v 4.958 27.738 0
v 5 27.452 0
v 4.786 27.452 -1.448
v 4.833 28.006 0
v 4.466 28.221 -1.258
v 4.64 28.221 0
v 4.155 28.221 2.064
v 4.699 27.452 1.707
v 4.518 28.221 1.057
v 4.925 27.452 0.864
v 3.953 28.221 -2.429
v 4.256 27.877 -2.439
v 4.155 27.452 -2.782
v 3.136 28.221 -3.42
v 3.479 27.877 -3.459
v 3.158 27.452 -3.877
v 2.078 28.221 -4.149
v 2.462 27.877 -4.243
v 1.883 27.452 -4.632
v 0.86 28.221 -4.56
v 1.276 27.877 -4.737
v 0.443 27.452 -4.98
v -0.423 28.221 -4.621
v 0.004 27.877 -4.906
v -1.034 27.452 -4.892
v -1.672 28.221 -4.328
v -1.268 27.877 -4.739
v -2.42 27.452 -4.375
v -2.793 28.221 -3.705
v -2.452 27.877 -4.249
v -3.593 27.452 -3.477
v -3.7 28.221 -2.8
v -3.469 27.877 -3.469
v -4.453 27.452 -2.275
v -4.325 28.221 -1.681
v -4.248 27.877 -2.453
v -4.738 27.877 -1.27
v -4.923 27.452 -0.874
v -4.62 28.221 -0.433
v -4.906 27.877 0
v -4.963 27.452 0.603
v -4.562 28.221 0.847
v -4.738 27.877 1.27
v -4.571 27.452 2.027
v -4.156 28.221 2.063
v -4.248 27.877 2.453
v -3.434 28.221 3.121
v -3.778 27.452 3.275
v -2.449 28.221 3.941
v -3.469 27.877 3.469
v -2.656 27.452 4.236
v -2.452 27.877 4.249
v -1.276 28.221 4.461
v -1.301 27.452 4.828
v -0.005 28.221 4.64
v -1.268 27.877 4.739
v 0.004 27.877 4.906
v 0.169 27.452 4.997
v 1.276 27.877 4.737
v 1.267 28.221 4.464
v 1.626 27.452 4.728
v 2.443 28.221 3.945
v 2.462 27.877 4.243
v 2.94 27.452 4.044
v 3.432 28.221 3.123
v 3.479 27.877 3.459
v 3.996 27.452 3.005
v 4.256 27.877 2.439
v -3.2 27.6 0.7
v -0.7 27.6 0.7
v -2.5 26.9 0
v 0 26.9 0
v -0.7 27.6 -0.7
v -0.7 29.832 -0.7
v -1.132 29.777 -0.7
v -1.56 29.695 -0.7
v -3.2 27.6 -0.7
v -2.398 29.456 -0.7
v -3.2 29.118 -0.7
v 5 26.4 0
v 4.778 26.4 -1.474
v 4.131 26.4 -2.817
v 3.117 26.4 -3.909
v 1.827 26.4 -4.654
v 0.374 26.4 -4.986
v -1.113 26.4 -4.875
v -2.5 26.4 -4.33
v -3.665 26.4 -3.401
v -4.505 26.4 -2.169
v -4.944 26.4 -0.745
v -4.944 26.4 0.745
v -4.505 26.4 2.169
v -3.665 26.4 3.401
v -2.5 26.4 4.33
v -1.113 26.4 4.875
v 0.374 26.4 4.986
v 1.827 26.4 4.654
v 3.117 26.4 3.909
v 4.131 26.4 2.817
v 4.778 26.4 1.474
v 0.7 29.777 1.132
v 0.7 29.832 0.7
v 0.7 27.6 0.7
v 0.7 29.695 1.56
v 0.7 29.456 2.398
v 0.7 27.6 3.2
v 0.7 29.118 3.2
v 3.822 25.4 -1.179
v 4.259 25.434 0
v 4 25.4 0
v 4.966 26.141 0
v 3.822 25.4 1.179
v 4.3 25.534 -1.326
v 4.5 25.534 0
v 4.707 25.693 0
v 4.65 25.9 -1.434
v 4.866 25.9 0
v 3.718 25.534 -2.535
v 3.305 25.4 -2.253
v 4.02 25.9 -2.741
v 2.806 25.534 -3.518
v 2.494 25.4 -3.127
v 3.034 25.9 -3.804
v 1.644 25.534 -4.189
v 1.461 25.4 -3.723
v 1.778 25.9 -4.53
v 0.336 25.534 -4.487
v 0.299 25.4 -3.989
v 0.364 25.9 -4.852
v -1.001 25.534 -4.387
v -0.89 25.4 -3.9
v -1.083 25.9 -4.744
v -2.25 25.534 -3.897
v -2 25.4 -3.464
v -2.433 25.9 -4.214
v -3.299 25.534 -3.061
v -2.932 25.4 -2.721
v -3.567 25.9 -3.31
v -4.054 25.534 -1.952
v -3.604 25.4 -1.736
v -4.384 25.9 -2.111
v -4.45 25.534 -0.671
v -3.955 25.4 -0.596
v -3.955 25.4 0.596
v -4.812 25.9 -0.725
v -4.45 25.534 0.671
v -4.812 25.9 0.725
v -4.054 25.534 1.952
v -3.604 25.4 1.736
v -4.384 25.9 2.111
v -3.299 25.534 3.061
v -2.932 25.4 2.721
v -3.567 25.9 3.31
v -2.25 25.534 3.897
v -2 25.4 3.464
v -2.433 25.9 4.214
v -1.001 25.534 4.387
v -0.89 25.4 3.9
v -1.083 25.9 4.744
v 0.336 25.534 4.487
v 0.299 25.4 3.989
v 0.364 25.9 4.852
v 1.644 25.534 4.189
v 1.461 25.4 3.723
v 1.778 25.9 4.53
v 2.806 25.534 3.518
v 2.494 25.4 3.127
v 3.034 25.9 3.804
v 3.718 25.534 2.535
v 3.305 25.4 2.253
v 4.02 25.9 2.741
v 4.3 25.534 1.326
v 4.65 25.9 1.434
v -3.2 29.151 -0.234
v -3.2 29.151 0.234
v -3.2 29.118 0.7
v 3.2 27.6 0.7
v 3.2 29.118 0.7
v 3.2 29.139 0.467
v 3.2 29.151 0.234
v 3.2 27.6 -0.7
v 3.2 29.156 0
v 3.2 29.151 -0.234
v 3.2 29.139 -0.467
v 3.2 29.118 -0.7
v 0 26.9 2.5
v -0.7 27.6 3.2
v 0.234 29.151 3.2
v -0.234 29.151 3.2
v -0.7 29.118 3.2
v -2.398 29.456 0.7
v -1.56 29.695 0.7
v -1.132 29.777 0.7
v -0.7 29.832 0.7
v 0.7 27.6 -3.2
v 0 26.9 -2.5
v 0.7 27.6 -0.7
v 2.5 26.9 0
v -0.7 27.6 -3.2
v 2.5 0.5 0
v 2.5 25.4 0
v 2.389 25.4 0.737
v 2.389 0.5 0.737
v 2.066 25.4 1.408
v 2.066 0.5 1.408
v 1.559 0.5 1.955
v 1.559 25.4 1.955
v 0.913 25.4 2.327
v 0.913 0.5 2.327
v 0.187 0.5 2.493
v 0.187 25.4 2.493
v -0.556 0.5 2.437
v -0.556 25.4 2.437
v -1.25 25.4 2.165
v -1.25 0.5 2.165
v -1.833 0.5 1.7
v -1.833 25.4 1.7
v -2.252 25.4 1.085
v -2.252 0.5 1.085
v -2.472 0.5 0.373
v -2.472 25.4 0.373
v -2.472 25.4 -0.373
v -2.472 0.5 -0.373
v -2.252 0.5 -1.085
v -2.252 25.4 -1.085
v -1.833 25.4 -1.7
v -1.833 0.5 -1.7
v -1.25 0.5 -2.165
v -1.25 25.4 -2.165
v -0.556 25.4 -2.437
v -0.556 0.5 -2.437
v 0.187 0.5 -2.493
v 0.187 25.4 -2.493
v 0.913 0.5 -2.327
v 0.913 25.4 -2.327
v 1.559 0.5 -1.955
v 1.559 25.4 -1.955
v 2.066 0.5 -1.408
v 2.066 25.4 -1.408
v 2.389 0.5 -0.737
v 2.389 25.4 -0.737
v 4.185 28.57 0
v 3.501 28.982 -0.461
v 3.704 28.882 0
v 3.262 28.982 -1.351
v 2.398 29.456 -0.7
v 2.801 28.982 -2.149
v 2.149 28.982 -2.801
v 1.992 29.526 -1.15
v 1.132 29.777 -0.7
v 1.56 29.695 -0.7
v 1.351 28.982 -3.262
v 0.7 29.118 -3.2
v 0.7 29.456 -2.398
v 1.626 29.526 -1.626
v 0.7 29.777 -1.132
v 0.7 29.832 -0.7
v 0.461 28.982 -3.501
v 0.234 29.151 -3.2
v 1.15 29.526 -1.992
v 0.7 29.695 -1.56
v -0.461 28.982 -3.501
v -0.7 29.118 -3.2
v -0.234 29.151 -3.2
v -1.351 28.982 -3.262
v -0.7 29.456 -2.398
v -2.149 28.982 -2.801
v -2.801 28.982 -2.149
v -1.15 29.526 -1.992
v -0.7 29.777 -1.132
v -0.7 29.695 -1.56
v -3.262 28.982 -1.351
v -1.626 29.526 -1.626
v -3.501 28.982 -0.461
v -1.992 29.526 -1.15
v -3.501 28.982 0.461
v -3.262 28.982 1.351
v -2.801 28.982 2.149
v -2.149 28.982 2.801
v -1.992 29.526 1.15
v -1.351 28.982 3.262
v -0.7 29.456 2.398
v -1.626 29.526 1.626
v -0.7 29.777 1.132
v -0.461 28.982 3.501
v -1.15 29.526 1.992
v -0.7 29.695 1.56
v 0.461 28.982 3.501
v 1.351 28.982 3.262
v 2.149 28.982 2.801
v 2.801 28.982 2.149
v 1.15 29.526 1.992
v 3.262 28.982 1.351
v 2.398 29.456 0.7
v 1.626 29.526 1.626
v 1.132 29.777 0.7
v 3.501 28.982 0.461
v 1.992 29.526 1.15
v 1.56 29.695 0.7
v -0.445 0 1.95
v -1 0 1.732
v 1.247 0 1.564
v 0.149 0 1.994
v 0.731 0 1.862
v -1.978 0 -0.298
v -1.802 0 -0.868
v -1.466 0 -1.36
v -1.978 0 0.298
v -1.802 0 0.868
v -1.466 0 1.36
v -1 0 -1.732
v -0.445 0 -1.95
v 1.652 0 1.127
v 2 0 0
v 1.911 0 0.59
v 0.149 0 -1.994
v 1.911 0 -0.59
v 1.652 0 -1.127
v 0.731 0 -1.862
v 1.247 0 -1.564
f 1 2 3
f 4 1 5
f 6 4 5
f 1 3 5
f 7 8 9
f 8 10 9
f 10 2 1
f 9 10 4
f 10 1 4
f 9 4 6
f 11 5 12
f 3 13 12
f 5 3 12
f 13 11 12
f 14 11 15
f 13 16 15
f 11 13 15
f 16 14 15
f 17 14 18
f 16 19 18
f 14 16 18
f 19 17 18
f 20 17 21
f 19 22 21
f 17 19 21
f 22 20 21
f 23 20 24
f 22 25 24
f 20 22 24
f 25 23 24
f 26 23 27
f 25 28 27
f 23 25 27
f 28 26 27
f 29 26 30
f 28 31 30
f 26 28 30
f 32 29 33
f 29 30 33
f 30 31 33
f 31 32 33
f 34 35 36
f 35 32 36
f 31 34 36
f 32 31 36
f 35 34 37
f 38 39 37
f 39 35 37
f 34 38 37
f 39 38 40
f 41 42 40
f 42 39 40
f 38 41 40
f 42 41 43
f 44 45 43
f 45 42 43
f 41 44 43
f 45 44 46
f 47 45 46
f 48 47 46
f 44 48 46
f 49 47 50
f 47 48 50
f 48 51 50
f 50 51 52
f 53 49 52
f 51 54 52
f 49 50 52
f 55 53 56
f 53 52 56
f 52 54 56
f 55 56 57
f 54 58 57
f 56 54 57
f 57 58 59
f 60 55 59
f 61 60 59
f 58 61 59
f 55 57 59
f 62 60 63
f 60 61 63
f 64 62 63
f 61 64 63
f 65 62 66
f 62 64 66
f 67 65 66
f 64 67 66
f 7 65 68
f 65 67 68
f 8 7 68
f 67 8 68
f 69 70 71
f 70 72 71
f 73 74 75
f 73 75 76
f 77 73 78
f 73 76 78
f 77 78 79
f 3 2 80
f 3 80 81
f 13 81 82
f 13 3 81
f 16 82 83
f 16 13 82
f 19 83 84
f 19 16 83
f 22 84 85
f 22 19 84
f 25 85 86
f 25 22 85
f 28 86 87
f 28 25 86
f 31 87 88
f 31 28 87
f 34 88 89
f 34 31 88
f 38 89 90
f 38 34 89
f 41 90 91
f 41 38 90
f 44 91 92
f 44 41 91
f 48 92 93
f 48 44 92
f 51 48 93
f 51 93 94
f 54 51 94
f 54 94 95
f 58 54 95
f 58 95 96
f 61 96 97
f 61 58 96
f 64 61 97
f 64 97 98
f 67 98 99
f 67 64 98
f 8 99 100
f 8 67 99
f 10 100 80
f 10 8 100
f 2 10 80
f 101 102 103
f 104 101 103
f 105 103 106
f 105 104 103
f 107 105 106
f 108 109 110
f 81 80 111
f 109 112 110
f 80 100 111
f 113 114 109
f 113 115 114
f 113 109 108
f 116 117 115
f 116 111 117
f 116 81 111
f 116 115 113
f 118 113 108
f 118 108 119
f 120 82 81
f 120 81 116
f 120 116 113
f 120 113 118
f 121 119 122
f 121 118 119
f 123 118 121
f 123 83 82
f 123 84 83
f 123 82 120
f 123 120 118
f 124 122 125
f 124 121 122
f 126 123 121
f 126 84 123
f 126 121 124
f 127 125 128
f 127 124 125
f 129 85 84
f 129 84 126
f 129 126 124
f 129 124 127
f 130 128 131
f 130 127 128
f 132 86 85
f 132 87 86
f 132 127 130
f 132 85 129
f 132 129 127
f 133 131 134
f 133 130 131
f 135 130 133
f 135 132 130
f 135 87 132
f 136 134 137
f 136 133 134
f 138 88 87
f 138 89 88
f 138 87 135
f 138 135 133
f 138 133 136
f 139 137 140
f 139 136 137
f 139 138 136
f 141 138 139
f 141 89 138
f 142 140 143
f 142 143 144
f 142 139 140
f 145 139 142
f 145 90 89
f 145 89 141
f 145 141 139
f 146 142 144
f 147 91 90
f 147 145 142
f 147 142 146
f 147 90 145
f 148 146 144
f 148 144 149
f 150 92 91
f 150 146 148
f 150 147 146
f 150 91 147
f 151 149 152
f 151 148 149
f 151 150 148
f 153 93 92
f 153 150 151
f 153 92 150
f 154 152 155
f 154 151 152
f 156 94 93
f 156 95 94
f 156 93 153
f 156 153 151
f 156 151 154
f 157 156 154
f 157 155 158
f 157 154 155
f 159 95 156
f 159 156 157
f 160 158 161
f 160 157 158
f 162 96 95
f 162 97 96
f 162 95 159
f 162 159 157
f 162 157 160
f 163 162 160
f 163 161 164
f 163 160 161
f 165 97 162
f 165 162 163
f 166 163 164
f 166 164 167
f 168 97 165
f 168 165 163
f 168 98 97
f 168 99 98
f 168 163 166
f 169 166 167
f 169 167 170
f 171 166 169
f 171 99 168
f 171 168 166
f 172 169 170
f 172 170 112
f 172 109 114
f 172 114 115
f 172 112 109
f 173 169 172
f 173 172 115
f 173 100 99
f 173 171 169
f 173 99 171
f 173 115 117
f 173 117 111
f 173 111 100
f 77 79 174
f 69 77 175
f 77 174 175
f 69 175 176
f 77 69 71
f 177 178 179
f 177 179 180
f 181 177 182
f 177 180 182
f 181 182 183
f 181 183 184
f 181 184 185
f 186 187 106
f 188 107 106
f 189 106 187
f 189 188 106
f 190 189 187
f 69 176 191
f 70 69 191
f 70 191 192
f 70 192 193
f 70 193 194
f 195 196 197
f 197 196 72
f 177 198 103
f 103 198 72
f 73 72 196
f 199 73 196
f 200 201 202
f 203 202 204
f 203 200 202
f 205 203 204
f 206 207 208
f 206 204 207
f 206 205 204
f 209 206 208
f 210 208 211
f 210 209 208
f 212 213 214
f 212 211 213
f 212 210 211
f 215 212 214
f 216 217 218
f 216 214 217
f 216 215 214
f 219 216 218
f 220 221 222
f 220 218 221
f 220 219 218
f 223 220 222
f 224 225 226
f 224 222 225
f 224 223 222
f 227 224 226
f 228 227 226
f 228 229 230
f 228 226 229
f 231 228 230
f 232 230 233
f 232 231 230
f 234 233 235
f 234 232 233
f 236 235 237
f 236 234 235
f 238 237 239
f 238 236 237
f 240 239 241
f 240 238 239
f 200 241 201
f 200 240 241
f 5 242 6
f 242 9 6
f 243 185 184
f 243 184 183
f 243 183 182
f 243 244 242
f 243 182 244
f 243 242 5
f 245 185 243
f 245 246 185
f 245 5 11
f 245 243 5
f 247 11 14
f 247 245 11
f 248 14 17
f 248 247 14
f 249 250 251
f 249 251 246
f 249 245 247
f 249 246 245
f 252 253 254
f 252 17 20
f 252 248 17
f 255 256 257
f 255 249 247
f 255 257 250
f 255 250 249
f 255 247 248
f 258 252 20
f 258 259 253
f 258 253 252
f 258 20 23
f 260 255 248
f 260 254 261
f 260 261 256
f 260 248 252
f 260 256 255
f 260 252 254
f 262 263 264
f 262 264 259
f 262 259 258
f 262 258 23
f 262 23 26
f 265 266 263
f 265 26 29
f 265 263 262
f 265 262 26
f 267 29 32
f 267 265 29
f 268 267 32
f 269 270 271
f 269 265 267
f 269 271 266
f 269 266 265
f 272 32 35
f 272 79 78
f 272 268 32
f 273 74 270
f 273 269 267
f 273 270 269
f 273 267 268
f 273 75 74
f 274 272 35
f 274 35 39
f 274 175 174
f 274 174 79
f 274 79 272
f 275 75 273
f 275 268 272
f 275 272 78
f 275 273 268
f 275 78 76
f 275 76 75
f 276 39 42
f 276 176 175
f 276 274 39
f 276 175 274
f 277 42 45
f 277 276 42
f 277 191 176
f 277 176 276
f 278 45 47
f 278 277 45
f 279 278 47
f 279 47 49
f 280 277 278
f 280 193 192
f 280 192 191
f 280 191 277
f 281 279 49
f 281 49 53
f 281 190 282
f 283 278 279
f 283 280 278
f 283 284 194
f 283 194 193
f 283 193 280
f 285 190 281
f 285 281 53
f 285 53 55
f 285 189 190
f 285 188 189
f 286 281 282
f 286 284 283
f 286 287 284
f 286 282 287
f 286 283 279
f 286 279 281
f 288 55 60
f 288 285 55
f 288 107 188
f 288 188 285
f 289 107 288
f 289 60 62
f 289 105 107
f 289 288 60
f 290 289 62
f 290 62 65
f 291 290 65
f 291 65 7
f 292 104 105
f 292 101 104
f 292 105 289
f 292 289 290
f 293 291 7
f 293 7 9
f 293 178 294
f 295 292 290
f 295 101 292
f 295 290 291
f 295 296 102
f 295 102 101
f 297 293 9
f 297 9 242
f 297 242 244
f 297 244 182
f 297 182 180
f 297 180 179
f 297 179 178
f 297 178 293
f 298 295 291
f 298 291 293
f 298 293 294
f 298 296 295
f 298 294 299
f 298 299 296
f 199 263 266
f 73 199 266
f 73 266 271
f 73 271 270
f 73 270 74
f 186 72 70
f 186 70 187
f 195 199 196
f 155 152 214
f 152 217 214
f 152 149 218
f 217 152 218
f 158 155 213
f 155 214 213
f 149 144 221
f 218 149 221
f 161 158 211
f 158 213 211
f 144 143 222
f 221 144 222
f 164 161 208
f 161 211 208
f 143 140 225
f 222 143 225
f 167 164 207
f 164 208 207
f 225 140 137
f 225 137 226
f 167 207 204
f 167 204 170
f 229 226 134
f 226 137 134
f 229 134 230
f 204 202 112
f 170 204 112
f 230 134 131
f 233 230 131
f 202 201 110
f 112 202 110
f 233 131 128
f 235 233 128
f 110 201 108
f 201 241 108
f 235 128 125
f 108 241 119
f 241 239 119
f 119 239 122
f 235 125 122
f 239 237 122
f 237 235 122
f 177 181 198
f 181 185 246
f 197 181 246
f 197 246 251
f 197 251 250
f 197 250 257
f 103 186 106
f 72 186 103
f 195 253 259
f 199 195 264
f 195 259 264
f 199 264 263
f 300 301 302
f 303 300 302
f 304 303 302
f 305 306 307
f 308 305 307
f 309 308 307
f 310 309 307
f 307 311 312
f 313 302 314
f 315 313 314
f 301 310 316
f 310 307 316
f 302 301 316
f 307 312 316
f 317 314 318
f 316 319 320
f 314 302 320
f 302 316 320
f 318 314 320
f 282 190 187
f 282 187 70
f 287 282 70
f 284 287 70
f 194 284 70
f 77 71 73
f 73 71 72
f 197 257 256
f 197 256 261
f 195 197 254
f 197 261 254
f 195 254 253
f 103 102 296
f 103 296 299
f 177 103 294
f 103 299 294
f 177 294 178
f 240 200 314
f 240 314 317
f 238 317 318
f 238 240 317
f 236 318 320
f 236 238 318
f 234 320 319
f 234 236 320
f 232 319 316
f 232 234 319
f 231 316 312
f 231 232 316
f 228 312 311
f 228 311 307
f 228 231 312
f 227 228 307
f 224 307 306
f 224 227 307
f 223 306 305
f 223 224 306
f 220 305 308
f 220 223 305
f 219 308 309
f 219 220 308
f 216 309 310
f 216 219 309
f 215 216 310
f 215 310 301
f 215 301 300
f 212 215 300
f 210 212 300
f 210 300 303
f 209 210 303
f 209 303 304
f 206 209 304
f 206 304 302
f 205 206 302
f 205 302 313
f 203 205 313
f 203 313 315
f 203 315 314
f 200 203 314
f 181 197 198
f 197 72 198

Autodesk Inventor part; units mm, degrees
ref_plane "YZ Plane" through (0, 0, 0) normal (1, 0, 0) x (0, 1, 0)
ref_plane "XZ Plane" through (0, 0, 0) normal (0, 1, 0) x (-1, 0, 0)
sketch "Sketch1" plane through (0, 0, 0) normal (0, 0, 1) x (1, 0, 0)
  line L0 (0, 0) -> (0, 25.4)
  line L1 (2.5, 25.4) -> (2.5, 0)
  line L2 (2.5, 0) -> (0, 0)
  line L3 (0, 25.4) -> (0, 29.9)
  arc A0 (5, 27.9) -> (0, 29.9) centre (0, 22.65) ccw
  line L4 (2.5, 25.4) -> (5, 25.4)
  line L5 (-9.3694, 47.064) -> (8.7897, 47.064) construction
  line L6 (8.7897, 47.064) -> (8.7897, -18.3846) construction
  line L7 (8.7897, -18.3846) -> (-9.3694, -18.3846) construction
  line L8 (-9.3694, -18.3846) -> (-9.3694, 47.064) construction
  line L9 (5, 25.4) -> (5, 27.9)
  dimension "d0" = 25.4
  dimension "d1" = 2.5
  dimension "d2" = 4.5
  dimension "d4" = 2.5
  dimension "d31" = 2.5
  dimension "d33" = 2.5
revolve "Revolution1" add sketch "Sketch1" angle 360 about axis through (0, 0, 0) along (0, 1, 0)
chamfer "Chamfer1" distance 0.5 angle 45 1 edges at (-2.5, 0, 0)
fillet "Fillet1" radius 1 2 edges at (-5, 25.4, 0) (-5, 27.9, 0)
ref_plane "Work Plane1" through (0, 29.9, 0) normal (0, -1, 0) x (1, 0, 0)
sketch "Sketch4" plane through (0, 29.9, 0) normal (0, -1, 0) x (1, 0, 0)
  line L0 (0.7, 0.7) -> (0.7, 3.2)
  line L1 (0.7, 3.2) -> (-0.7, 3.2)
  line L2 (-0.7, 3.2) -> (-0.7, 0.7)
  line L3 (0.7, 0.7) -> (3.2, 0.7)
  line L4 (3.2, 0.7) -> (3.2, -0.7)
  line L5 (3.2, -0.7) -> (0.7, -0.7)
  line L6 (0.7, -0.7) -> (0.7, -3.2)
  line L7 (0.7, -3.2) -> (-0.7, -3.2)
  line L8 (-0.7, -3.2) -> (-0.7, -0.7)
  line L9 (-0.7, -0.7) -> (-3.2, -0.7)
  line L10 (-3.2, -0.7) -> (-3.2, 0.7)
  line L11 (-3.2, 0.7) -> (-0.7, 0.7)
  point P0 (0, 0)
  dimension "d57" = 2.5
  dimension "d58" = 1.4
  dimension "d59" = 2.5
  dimension "d60" = 1.4
  dimension "d61" = 2.5
  dimension "d62" = 2.5
  dimension "d63" = 1.4
  dimension "d64" = 90
  dimension "d65" = 2.5
  dimension "d66" = 1.4
  dimension "d67" = 90
extrude "Extrusion1" cut sketch "Sketch4" along normal blind 3
chamfer "Chamfer2" distance 0.7 angle 45 12 edges at (0.7, 26.9, -1.95) (0, 26.9, -3.2) (-0.7, 26.9, -1.95) (-1.95, 26.9, -0.7) (-3.2, 26.9, 0) (-1.95, 26.9, 0.7) (-0.7, 26.9, 1.95) (1.95, 26.9, -0.7) (3.2, 26.9, 0) (1.95, 26.9, 0.7) (0.7, 26.9, 1.95) (0, 26.9, 3.2)
properties part number "pan_head_screw" material "Stainless Steel, Polished"
